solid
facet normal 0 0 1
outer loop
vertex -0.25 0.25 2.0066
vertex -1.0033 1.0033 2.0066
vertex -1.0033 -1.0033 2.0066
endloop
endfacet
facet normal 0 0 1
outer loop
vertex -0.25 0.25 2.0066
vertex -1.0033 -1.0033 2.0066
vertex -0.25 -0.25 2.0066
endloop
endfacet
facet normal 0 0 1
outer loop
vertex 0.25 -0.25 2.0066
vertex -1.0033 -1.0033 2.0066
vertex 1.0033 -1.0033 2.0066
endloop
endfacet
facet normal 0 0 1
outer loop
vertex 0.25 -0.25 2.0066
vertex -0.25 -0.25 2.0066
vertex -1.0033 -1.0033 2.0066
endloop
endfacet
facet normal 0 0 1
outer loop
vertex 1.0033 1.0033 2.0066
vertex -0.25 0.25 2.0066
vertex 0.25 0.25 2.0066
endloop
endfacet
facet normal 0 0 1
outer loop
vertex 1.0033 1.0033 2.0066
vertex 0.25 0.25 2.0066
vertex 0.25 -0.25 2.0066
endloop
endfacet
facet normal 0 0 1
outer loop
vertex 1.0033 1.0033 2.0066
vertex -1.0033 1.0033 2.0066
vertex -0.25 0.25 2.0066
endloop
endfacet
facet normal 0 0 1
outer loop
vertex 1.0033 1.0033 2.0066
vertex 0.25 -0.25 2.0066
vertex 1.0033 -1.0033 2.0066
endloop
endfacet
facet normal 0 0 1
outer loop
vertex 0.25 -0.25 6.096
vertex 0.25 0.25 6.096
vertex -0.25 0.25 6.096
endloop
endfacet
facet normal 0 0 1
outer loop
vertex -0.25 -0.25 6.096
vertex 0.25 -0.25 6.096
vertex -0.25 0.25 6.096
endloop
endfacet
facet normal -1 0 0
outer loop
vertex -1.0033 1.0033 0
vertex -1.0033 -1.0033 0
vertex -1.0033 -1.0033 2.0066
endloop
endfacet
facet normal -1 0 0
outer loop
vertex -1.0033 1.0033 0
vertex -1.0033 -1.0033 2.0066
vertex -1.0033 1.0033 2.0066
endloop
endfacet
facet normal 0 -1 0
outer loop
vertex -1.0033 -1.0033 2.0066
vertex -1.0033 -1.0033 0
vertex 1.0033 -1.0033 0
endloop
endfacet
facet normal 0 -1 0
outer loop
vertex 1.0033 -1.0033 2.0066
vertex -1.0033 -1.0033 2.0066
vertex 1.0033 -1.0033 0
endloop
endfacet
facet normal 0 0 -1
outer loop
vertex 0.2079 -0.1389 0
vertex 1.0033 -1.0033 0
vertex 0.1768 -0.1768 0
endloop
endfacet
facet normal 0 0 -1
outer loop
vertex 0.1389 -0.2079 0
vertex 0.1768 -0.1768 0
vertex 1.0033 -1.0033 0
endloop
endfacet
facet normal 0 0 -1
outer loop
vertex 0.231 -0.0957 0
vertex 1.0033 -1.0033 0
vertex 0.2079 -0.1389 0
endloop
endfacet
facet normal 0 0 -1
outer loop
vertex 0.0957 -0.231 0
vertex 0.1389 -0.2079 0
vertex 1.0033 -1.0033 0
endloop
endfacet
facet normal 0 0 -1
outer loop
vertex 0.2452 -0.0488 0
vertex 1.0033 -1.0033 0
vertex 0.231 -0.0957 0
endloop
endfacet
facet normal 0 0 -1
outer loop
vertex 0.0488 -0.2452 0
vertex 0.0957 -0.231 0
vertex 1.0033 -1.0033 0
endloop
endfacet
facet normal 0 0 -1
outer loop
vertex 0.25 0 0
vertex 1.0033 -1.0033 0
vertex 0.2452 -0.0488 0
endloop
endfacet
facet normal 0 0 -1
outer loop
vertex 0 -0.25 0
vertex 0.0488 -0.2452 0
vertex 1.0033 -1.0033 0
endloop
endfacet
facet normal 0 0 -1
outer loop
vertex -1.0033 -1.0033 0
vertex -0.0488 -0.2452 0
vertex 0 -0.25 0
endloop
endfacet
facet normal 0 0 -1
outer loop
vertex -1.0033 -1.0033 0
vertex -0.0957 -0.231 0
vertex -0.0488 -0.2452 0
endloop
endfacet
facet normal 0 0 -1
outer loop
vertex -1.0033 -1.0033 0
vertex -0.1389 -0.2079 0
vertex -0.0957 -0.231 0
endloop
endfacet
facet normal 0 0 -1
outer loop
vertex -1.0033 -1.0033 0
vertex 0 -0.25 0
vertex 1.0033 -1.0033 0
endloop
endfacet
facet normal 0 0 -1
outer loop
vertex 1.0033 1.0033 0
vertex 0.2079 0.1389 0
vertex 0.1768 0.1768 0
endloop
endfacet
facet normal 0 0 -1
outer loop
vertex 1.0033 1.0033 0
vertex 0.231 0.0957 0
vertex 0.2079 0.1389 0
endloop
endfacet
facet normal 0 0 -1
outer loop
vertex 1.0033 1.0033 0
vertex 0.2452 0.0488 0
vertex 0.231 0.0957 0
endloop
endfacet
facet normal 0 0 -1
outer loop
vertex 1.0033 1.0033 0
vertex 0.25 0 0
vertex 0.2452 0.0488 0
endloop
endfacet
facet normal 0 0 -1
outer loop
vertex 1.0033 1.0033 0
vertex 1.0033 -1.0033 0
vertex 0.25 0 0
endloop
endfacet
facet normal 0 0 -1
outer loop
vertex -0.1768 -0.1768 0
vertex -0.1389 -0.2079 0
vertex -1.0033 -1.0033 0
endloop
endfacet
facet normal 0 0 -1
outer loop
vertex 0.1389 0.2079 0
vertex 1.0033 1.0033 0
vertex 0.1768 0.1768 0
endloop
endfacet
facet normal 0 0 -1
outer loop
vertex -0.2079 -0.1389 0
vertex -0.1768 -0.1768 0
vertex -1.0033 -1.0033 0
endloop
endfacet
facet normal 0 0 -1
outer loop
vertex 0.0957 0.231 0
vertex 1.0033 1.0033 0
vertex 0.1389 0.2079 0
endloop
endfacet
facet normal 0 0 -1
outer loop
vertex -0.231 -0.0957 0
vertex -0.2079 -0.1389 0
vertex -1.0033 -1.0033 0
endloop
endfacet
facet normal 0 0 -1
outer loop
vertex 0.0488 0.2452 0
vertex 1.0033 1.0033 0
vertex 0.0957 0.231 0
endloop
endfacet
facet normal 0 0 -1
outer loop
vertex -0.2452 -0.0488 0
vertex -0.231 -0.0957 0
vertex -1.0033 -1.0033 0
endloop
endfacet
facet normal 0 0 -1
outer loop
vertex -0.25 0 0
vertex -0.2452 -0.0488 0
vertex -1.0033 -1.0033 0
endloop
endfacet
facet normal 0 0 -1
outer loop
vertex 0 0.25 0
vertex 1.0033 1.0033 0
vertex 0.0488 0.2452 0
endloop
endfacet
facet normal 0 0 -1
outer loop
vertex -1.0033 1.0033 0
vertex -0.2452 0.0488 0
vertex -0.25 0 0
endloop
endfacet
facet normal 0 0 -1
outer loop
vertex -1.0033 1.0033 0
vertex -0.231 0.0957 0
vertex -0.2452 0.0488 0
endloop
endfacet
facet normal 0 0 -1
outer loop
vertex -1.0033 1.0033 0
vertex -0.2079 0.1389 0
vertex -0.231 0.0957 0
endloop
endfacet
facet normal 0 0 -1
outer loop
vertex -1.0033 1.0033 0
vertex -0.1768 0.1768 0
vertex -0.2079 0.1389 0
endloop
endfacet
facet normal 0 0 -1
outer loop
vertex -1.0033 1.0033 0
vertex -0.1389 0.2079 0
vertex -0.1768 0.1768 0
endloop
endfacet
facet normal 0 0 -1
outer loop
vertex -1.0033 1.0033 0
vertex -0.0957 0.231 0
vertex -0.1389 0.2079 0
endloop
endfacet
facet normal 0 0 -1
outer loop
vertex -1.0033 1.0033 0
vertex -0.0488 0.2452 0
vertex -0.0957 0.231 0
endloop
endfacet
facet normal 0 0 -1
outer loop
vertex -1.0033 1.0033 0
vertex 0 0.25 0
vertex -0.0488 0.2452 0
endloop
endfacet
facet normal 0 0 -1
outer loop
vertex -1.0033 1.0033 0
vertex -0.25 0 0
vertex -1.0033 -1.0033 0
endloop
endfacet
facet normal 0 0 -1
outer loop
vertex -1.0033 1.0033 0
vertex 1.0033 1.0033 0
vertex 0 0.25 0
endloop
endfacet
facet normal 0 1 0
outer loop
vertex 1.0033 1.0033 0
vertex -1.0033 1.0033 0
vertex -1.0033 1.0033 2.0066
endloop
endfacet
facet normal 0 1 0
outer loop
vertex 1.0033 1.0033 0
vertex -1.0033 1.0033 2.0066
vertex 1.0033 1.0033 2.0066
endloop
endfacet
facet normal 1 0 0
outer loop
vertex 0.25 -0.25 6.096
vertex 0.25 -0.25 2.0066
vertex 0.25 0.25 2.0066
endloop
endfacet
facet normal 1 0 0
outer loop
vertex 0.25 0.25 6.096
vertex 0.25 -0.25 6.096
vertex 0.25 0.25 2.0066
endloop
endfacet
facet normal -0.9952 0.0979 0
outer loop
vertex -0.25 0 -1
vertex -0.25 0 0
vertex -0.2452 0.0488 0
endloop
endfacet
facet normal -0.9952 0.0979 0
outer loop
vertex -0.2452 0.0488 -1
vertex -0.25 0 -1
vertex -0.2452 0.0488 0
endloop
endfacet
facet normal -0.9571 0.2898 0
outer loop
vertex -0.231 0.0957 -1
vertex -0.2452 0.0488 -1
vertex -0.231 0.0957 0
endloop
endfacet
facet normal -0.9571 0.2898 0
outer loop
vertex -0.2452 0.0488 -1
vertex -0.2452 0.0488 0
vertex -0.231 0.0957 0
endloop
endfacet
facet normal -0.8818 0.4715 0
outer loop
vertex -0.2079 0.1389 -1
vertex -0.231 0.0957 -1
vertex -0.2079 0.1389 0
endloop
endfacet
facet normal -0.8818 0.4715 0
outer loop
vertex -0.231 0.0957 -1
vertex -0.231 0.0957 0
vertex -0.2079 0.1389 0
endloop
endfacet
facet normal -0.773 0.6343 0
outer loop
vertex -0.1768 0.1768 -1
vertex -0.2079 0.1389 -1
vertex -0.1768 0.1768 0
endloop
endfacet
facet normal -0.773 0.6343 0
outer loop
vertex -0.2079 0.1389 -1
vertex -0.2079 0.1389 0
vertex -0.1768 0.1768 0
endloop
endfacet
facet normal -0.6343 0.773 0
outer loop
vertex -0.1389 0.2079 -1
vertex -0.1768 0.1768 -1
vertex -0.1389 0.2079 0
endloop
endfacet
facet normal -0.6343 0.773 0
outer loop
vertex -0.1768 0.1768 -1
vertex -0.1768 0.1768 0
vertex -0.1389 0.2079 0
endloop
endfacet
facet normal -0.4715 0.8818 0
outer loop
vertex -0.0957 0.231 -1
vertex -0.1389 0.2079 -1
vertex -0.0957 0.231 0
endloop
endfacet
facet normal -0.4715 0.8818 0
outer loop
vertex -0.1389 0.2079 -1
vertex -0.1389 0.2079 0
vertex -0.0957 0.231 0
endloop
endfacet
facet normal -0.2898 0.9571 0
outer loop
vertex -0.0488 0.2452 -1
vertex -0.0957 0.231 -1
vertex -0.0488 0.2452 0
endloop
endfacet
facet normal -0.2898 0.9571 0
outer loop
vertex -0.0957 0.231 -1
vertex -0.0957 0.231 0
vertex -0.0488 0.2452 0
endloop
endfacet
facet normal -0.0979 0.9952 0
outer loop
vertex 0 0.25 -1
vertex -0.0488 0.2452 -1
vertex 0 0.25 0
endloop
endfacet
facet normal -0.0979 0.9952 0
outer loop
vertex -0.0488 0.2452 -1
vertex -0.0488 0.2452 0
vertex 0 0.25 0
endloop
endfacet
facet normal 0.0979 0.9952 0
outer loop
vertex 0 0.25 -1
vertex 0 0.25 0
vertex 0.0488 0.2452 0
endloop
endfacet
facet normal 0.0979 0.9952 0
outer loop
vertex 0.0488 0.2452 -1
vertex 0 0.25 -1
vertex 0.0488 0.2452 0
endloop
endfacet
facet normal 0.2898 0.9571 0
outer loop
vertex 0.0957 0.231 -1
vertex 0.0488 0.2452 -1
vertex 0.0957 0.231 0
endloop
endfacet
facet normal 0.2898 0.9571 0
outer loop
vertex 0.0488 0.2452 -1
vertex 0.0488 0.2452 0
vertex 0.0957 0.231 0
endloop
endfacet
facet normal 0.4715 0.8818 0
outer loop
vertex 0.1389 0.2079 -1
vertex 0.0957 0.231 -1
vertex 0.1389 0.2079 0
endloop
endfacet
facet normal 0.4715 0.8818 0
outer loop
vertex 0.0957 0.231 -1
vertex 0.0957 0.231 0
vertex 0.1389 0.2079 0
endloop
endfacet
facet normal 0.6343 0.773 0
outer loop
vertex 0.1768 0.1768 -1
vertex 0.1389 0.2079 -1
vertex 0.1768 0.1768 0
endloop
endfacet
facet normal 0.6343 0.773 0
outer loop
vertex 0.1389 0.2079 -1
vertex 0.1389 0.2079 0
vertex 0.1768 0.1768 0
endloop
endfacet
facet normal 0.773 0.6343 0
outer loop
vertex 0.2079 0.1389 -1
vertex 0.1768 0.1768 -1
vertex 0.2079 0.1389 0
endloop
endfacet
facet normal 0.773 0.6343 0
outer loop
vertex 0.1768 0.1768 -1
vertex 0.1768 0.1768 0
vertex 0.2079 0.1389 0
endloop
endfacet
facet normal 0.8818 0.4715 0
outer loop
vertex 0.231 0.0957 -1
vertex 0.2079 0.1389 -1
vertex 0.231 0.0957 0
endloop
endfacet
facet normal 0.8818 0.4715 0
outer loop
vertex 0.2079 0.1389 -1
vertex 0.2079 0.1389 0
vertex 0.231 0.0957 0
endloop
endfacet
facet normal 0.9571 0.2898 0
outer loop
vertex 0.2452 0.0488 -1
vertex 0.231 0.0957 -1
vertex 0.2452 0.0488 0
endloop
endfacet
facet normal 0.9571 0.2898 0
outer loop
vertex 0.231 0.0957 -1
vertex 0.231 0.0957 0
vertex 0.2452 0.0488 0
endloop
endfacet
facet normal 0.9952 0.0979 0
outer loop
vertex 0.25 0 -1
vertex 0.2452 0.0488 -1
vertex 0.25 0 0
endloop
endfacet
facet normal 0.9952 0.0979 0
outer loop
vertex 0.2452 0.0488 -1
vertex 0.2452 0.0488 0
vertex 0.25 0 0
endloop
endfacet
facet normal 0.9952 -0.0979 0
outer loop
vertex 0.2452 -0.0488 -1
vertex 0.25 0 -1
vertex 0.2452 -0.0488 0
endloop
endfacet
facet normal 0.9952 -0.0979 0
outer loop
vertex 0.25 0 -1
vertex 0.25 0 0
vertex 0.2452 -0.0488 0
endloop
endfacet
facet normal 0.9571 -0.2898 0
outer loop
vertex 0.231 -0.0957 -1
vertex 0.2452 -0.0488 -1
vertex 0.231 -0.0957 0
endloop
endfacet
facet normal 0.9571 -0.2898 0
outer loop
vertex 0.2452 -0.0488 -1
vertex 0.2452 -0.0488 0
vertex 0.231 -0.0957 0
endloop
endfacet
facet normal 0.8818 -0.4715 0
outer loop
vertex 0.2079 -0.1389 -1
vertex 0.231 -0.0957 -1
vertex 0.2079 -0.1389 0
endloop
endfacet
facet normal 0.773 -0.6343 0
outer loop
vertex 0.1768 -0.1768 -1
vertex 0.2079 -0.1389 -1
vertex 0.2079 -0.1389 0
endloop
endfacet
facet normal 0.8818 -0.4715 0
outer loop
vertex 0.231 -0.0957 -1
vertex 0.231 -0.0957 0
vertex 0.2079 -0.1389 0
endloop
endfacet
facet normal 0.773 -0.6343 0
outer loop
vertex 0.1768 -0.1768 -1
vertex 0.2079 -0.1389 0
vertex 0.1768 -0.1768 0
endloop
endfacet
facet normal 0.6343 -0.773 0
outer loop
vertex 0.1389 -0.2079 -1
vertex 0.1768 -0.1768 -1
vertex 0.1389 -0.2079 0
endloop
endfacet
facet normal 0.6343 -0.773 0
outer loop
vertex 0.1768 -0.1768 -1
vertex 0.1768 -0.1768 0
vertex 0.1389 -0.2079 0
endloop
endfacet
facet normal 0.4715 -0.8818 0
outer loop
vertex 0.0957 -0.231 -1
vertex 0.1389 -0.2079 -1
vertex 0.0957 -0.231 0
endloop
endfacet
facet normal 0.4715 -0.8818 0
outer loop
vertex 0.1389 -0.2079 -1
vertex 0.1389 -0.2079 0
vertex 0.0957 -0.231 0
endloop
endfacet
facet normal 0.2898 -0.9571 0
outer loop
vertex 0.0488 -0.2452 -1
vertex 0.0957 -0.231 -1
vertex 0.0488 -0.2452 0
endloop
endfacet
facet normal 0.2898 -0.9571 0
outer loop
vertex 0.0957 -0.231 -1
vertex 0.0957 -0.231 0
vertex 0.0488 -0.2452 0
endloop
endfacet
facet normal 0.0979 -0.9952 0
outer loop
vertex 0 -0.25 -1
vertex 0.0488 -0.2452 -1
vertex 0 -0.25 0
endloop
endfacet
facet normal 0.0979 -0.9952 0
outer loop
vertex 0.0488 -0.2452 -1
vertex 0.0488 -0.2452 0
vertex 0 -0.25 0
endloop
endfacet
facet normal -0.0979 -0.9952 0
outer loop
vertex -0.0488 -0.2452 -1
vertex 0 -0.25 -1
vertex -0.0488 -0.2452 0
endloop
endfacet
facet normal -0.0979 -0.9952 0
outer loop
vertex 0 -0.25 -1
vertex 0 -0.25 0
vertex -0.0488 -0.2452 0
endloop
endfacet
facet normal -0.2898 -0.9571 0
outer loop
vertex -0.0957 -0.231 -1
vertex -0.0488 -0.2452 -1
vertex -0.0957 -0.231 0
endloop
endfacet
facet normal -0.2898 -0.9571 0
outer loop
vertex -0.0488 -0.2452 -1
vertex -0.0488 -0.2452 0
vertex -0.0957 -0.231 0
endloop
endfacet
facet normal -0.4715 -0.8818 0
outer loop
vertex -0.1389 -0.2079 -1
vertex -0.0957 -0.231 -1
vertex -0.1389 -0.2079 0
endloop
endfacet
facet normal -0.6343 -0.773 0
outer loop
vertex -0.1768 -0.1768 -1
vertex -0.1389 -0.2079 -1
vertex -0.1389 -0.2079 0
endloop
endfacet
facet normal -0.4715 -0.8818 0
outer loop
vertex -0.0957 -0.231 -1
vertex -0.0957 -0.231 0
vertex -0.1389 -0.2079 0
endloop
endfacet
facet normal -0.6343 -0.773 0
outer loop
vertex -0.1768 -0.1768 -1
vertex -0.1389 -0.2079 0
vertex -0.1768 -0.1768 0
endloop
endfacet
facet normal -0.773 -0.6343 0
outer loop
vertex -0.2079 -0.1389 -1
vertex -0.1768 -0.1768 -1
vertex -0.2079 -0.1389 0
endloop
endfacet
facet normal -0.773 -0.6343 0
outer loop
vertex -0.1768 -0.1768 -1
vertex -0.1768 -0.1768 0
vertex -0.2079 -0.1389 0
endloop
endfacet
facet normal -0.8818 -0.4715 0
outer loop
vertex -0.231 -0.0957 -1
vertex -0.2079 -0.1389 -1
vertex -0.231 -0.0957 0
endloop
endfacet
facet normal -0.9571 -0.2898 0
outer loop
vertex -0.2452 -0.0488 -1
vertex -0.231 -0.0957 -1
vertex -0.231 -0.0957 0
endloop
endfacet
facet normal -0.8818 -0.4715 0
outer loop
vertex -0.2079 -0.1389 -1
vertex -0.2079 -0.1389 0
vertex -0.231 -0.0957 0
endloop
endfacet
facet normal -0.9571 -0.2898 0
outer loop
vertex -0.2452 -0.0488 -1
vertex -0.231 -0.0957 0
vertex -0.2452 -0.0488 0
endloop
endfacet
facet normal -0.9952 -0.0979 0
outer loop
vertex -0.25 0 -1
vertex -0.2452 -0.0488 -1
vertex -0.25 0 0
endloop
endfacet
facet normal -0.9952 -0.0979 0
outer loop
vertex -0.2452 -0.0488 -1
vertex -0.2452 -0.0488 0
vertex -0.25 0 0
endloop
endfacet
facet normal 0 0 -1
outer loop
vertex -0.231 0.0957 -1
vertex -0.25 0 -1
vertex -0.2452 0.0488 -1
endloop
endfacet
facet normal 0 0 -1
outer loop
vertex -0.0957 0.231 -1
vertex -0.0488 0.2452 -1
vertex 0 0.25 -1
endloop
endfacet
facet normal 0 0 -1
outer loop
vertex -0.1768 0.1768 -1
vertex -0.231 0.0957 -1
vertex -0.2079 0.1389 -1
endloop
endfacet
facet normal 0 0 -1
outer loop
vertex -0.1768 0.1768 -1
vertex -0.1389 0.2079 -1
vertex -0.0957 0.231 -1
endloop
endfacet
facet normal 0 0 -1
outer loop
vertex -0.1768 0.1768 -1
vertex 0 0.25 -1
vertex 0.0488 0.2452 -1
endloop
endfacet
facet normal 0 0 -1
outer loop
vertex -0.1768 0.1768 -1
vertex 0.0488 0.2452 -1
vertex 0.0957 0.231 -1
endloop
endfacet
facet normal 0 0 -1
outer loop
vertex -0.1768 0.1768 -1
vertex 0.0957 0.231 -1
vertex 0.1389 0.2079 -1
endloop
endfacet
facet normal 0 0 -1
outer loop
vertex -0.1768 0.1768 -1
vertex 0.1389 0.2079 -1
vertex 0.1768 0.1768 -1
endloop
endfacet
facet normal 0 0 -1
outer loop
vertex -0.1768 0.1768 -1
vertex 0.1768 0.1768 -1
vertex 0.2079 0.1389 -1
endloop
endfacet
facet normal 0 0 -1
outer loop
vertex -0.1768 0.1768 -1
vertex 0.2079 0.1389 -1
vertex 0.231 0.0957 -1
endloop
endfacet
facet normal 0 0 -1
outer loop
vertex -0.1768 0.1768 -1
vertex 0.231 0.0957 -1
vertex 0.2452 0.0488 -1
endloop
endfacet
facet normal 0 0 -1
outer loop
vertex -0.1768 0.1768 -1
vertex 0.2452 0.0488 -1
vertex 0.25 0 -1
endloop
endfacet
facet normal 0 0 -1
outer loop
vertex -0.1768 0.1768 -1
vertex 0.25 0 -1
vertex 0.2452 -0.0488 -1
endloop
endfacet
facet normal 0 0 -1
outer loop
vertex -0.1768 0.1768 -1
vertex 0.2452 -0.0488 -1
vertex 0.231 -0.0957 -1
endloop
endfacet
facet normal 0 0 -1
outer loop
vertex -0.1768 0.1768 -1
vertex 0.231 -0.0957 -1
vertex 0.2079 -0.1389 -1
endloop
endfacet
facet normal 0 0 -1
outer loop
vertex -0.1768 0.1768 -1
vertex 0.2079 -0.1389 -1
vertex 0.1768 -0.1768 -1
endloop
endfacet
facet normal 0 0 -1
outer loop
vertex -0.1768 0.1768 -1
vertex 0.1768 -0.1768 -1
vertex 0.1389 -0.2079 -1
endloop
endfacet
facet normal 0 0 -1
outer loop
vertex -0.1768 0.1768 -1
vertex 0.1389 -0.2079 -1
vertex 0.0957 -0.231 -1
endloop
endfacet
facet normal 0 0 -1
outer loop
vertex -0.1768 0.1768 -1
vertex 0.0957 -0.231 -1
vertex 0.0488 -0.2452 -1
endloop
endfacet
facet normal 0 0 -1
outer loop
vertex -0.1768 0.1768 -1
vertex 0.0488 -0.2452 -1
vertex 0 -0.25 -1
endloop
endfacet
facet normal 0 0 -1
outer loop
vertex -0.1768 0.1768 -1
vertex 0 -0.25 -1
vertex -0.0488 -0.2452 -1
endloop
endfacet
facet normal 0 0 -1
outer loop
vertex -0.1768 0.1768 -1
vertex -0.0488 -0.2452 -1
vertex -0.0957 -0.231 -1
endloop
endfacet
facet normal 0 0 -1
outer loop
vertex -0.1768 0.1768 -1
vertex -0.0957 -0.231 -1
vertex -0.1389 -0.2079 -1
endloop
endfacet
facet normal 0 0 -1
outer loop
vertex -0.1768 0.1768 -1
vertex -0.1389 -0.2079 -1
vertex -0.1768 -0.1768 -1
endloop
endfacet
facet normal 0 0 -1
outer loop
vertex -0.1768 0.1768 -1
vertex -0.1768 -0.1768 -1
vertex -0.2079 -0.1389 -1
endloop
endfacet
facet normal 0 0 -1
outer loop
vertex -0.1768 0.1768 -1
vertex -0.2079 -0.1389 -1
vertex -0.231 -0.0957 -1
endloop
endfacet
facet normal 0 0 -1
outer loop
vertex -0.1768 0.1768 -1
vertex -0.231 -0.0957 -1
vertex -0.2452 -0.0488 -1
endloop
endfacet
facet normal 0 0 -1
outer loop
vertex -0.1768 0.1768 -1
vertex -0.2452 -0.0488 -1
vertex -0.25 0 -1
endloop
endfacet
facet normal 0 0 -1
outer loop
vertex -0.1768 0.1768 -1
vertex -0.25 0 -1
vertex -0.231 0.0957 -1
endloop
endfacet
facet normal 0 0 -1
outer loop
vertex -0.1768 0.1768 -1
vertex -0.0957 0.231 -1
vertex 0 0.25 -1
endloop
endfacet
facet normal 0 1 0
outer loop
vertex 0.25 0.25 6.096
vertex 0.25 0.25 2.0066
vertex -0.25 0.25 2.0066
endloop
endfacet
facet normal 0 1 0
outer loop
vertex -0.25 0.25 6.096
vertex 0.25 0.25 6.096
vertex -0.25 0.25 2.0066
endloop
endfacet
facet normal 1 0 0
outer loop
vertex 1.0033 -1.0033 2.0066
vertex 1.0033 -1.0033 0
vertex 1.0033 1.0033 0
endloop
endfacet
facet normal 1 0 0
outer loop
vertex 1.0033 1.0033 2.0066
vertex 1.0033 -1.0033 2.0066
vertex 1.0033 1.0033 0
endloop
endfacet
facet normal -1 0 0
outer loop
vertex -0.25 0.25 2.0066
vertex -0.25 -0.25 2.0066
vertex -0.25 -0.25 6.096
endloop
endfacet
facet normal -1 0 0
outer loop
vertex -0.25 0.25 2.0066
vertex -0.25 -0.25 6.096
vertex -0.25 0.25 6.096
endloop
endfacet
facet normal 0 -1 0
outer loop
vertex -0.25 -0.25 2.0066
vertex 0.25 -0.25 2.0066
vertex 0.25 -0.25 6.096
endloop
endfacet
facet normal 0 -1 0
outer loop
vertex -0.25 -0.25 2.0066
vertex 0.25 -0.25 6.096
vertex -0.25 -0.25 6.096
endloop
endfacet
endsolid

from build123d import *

# Parameters (mm, degrees)
CROQUIS1_W              = 2.0066
CROQUIS1_H              = 2.0066
SALIENTE_EXTRUIR1_DEPTH = 2.0066
CROQUIS3_W              = 0.5
CROQUIS3_H              = 0.5
SALIENTE_EXTRUIR3_DEPTH = 6.096
CROQUIS4_R              = 0.25
SALIENTE_EXTRUIR4_DEPTH = 1


with BuildPart() as part:
    # Croquis1 → Saliente-Extruir1 (new body)
    with BuildSketch(Plane.XY):
        Rectangle(CROQUIS1_W, CROQUIS1_H)
    extrude(amount=SALIENTE_EXTRUIR1_DEPTH)

    # Croquis3 → Saliente-Extruir3 (add)
    with BuildSketch(Plane(origin=(0, 0, 0), x_dir=(-1, 0, 0), z_dir=(0, 0, -1))):
        Rectangle(CROQUIS3_W, CROQUIS3_H)
    extrude(amount=-SALIENTE_EXTRUIR3_DEPTH)

    # Croquis4 → Saliente-Extruir4 (add)
    with BuildSketch(Plane(origin=(0, 0, 0), x_dir=(-1, 0, 0), z_dir=(0, 0, -1))):
        Circle(CROQUIS4_R)
    extrude(amount=SALIENTE_EXTRUIR4_DEPTH)


solid = part.part
